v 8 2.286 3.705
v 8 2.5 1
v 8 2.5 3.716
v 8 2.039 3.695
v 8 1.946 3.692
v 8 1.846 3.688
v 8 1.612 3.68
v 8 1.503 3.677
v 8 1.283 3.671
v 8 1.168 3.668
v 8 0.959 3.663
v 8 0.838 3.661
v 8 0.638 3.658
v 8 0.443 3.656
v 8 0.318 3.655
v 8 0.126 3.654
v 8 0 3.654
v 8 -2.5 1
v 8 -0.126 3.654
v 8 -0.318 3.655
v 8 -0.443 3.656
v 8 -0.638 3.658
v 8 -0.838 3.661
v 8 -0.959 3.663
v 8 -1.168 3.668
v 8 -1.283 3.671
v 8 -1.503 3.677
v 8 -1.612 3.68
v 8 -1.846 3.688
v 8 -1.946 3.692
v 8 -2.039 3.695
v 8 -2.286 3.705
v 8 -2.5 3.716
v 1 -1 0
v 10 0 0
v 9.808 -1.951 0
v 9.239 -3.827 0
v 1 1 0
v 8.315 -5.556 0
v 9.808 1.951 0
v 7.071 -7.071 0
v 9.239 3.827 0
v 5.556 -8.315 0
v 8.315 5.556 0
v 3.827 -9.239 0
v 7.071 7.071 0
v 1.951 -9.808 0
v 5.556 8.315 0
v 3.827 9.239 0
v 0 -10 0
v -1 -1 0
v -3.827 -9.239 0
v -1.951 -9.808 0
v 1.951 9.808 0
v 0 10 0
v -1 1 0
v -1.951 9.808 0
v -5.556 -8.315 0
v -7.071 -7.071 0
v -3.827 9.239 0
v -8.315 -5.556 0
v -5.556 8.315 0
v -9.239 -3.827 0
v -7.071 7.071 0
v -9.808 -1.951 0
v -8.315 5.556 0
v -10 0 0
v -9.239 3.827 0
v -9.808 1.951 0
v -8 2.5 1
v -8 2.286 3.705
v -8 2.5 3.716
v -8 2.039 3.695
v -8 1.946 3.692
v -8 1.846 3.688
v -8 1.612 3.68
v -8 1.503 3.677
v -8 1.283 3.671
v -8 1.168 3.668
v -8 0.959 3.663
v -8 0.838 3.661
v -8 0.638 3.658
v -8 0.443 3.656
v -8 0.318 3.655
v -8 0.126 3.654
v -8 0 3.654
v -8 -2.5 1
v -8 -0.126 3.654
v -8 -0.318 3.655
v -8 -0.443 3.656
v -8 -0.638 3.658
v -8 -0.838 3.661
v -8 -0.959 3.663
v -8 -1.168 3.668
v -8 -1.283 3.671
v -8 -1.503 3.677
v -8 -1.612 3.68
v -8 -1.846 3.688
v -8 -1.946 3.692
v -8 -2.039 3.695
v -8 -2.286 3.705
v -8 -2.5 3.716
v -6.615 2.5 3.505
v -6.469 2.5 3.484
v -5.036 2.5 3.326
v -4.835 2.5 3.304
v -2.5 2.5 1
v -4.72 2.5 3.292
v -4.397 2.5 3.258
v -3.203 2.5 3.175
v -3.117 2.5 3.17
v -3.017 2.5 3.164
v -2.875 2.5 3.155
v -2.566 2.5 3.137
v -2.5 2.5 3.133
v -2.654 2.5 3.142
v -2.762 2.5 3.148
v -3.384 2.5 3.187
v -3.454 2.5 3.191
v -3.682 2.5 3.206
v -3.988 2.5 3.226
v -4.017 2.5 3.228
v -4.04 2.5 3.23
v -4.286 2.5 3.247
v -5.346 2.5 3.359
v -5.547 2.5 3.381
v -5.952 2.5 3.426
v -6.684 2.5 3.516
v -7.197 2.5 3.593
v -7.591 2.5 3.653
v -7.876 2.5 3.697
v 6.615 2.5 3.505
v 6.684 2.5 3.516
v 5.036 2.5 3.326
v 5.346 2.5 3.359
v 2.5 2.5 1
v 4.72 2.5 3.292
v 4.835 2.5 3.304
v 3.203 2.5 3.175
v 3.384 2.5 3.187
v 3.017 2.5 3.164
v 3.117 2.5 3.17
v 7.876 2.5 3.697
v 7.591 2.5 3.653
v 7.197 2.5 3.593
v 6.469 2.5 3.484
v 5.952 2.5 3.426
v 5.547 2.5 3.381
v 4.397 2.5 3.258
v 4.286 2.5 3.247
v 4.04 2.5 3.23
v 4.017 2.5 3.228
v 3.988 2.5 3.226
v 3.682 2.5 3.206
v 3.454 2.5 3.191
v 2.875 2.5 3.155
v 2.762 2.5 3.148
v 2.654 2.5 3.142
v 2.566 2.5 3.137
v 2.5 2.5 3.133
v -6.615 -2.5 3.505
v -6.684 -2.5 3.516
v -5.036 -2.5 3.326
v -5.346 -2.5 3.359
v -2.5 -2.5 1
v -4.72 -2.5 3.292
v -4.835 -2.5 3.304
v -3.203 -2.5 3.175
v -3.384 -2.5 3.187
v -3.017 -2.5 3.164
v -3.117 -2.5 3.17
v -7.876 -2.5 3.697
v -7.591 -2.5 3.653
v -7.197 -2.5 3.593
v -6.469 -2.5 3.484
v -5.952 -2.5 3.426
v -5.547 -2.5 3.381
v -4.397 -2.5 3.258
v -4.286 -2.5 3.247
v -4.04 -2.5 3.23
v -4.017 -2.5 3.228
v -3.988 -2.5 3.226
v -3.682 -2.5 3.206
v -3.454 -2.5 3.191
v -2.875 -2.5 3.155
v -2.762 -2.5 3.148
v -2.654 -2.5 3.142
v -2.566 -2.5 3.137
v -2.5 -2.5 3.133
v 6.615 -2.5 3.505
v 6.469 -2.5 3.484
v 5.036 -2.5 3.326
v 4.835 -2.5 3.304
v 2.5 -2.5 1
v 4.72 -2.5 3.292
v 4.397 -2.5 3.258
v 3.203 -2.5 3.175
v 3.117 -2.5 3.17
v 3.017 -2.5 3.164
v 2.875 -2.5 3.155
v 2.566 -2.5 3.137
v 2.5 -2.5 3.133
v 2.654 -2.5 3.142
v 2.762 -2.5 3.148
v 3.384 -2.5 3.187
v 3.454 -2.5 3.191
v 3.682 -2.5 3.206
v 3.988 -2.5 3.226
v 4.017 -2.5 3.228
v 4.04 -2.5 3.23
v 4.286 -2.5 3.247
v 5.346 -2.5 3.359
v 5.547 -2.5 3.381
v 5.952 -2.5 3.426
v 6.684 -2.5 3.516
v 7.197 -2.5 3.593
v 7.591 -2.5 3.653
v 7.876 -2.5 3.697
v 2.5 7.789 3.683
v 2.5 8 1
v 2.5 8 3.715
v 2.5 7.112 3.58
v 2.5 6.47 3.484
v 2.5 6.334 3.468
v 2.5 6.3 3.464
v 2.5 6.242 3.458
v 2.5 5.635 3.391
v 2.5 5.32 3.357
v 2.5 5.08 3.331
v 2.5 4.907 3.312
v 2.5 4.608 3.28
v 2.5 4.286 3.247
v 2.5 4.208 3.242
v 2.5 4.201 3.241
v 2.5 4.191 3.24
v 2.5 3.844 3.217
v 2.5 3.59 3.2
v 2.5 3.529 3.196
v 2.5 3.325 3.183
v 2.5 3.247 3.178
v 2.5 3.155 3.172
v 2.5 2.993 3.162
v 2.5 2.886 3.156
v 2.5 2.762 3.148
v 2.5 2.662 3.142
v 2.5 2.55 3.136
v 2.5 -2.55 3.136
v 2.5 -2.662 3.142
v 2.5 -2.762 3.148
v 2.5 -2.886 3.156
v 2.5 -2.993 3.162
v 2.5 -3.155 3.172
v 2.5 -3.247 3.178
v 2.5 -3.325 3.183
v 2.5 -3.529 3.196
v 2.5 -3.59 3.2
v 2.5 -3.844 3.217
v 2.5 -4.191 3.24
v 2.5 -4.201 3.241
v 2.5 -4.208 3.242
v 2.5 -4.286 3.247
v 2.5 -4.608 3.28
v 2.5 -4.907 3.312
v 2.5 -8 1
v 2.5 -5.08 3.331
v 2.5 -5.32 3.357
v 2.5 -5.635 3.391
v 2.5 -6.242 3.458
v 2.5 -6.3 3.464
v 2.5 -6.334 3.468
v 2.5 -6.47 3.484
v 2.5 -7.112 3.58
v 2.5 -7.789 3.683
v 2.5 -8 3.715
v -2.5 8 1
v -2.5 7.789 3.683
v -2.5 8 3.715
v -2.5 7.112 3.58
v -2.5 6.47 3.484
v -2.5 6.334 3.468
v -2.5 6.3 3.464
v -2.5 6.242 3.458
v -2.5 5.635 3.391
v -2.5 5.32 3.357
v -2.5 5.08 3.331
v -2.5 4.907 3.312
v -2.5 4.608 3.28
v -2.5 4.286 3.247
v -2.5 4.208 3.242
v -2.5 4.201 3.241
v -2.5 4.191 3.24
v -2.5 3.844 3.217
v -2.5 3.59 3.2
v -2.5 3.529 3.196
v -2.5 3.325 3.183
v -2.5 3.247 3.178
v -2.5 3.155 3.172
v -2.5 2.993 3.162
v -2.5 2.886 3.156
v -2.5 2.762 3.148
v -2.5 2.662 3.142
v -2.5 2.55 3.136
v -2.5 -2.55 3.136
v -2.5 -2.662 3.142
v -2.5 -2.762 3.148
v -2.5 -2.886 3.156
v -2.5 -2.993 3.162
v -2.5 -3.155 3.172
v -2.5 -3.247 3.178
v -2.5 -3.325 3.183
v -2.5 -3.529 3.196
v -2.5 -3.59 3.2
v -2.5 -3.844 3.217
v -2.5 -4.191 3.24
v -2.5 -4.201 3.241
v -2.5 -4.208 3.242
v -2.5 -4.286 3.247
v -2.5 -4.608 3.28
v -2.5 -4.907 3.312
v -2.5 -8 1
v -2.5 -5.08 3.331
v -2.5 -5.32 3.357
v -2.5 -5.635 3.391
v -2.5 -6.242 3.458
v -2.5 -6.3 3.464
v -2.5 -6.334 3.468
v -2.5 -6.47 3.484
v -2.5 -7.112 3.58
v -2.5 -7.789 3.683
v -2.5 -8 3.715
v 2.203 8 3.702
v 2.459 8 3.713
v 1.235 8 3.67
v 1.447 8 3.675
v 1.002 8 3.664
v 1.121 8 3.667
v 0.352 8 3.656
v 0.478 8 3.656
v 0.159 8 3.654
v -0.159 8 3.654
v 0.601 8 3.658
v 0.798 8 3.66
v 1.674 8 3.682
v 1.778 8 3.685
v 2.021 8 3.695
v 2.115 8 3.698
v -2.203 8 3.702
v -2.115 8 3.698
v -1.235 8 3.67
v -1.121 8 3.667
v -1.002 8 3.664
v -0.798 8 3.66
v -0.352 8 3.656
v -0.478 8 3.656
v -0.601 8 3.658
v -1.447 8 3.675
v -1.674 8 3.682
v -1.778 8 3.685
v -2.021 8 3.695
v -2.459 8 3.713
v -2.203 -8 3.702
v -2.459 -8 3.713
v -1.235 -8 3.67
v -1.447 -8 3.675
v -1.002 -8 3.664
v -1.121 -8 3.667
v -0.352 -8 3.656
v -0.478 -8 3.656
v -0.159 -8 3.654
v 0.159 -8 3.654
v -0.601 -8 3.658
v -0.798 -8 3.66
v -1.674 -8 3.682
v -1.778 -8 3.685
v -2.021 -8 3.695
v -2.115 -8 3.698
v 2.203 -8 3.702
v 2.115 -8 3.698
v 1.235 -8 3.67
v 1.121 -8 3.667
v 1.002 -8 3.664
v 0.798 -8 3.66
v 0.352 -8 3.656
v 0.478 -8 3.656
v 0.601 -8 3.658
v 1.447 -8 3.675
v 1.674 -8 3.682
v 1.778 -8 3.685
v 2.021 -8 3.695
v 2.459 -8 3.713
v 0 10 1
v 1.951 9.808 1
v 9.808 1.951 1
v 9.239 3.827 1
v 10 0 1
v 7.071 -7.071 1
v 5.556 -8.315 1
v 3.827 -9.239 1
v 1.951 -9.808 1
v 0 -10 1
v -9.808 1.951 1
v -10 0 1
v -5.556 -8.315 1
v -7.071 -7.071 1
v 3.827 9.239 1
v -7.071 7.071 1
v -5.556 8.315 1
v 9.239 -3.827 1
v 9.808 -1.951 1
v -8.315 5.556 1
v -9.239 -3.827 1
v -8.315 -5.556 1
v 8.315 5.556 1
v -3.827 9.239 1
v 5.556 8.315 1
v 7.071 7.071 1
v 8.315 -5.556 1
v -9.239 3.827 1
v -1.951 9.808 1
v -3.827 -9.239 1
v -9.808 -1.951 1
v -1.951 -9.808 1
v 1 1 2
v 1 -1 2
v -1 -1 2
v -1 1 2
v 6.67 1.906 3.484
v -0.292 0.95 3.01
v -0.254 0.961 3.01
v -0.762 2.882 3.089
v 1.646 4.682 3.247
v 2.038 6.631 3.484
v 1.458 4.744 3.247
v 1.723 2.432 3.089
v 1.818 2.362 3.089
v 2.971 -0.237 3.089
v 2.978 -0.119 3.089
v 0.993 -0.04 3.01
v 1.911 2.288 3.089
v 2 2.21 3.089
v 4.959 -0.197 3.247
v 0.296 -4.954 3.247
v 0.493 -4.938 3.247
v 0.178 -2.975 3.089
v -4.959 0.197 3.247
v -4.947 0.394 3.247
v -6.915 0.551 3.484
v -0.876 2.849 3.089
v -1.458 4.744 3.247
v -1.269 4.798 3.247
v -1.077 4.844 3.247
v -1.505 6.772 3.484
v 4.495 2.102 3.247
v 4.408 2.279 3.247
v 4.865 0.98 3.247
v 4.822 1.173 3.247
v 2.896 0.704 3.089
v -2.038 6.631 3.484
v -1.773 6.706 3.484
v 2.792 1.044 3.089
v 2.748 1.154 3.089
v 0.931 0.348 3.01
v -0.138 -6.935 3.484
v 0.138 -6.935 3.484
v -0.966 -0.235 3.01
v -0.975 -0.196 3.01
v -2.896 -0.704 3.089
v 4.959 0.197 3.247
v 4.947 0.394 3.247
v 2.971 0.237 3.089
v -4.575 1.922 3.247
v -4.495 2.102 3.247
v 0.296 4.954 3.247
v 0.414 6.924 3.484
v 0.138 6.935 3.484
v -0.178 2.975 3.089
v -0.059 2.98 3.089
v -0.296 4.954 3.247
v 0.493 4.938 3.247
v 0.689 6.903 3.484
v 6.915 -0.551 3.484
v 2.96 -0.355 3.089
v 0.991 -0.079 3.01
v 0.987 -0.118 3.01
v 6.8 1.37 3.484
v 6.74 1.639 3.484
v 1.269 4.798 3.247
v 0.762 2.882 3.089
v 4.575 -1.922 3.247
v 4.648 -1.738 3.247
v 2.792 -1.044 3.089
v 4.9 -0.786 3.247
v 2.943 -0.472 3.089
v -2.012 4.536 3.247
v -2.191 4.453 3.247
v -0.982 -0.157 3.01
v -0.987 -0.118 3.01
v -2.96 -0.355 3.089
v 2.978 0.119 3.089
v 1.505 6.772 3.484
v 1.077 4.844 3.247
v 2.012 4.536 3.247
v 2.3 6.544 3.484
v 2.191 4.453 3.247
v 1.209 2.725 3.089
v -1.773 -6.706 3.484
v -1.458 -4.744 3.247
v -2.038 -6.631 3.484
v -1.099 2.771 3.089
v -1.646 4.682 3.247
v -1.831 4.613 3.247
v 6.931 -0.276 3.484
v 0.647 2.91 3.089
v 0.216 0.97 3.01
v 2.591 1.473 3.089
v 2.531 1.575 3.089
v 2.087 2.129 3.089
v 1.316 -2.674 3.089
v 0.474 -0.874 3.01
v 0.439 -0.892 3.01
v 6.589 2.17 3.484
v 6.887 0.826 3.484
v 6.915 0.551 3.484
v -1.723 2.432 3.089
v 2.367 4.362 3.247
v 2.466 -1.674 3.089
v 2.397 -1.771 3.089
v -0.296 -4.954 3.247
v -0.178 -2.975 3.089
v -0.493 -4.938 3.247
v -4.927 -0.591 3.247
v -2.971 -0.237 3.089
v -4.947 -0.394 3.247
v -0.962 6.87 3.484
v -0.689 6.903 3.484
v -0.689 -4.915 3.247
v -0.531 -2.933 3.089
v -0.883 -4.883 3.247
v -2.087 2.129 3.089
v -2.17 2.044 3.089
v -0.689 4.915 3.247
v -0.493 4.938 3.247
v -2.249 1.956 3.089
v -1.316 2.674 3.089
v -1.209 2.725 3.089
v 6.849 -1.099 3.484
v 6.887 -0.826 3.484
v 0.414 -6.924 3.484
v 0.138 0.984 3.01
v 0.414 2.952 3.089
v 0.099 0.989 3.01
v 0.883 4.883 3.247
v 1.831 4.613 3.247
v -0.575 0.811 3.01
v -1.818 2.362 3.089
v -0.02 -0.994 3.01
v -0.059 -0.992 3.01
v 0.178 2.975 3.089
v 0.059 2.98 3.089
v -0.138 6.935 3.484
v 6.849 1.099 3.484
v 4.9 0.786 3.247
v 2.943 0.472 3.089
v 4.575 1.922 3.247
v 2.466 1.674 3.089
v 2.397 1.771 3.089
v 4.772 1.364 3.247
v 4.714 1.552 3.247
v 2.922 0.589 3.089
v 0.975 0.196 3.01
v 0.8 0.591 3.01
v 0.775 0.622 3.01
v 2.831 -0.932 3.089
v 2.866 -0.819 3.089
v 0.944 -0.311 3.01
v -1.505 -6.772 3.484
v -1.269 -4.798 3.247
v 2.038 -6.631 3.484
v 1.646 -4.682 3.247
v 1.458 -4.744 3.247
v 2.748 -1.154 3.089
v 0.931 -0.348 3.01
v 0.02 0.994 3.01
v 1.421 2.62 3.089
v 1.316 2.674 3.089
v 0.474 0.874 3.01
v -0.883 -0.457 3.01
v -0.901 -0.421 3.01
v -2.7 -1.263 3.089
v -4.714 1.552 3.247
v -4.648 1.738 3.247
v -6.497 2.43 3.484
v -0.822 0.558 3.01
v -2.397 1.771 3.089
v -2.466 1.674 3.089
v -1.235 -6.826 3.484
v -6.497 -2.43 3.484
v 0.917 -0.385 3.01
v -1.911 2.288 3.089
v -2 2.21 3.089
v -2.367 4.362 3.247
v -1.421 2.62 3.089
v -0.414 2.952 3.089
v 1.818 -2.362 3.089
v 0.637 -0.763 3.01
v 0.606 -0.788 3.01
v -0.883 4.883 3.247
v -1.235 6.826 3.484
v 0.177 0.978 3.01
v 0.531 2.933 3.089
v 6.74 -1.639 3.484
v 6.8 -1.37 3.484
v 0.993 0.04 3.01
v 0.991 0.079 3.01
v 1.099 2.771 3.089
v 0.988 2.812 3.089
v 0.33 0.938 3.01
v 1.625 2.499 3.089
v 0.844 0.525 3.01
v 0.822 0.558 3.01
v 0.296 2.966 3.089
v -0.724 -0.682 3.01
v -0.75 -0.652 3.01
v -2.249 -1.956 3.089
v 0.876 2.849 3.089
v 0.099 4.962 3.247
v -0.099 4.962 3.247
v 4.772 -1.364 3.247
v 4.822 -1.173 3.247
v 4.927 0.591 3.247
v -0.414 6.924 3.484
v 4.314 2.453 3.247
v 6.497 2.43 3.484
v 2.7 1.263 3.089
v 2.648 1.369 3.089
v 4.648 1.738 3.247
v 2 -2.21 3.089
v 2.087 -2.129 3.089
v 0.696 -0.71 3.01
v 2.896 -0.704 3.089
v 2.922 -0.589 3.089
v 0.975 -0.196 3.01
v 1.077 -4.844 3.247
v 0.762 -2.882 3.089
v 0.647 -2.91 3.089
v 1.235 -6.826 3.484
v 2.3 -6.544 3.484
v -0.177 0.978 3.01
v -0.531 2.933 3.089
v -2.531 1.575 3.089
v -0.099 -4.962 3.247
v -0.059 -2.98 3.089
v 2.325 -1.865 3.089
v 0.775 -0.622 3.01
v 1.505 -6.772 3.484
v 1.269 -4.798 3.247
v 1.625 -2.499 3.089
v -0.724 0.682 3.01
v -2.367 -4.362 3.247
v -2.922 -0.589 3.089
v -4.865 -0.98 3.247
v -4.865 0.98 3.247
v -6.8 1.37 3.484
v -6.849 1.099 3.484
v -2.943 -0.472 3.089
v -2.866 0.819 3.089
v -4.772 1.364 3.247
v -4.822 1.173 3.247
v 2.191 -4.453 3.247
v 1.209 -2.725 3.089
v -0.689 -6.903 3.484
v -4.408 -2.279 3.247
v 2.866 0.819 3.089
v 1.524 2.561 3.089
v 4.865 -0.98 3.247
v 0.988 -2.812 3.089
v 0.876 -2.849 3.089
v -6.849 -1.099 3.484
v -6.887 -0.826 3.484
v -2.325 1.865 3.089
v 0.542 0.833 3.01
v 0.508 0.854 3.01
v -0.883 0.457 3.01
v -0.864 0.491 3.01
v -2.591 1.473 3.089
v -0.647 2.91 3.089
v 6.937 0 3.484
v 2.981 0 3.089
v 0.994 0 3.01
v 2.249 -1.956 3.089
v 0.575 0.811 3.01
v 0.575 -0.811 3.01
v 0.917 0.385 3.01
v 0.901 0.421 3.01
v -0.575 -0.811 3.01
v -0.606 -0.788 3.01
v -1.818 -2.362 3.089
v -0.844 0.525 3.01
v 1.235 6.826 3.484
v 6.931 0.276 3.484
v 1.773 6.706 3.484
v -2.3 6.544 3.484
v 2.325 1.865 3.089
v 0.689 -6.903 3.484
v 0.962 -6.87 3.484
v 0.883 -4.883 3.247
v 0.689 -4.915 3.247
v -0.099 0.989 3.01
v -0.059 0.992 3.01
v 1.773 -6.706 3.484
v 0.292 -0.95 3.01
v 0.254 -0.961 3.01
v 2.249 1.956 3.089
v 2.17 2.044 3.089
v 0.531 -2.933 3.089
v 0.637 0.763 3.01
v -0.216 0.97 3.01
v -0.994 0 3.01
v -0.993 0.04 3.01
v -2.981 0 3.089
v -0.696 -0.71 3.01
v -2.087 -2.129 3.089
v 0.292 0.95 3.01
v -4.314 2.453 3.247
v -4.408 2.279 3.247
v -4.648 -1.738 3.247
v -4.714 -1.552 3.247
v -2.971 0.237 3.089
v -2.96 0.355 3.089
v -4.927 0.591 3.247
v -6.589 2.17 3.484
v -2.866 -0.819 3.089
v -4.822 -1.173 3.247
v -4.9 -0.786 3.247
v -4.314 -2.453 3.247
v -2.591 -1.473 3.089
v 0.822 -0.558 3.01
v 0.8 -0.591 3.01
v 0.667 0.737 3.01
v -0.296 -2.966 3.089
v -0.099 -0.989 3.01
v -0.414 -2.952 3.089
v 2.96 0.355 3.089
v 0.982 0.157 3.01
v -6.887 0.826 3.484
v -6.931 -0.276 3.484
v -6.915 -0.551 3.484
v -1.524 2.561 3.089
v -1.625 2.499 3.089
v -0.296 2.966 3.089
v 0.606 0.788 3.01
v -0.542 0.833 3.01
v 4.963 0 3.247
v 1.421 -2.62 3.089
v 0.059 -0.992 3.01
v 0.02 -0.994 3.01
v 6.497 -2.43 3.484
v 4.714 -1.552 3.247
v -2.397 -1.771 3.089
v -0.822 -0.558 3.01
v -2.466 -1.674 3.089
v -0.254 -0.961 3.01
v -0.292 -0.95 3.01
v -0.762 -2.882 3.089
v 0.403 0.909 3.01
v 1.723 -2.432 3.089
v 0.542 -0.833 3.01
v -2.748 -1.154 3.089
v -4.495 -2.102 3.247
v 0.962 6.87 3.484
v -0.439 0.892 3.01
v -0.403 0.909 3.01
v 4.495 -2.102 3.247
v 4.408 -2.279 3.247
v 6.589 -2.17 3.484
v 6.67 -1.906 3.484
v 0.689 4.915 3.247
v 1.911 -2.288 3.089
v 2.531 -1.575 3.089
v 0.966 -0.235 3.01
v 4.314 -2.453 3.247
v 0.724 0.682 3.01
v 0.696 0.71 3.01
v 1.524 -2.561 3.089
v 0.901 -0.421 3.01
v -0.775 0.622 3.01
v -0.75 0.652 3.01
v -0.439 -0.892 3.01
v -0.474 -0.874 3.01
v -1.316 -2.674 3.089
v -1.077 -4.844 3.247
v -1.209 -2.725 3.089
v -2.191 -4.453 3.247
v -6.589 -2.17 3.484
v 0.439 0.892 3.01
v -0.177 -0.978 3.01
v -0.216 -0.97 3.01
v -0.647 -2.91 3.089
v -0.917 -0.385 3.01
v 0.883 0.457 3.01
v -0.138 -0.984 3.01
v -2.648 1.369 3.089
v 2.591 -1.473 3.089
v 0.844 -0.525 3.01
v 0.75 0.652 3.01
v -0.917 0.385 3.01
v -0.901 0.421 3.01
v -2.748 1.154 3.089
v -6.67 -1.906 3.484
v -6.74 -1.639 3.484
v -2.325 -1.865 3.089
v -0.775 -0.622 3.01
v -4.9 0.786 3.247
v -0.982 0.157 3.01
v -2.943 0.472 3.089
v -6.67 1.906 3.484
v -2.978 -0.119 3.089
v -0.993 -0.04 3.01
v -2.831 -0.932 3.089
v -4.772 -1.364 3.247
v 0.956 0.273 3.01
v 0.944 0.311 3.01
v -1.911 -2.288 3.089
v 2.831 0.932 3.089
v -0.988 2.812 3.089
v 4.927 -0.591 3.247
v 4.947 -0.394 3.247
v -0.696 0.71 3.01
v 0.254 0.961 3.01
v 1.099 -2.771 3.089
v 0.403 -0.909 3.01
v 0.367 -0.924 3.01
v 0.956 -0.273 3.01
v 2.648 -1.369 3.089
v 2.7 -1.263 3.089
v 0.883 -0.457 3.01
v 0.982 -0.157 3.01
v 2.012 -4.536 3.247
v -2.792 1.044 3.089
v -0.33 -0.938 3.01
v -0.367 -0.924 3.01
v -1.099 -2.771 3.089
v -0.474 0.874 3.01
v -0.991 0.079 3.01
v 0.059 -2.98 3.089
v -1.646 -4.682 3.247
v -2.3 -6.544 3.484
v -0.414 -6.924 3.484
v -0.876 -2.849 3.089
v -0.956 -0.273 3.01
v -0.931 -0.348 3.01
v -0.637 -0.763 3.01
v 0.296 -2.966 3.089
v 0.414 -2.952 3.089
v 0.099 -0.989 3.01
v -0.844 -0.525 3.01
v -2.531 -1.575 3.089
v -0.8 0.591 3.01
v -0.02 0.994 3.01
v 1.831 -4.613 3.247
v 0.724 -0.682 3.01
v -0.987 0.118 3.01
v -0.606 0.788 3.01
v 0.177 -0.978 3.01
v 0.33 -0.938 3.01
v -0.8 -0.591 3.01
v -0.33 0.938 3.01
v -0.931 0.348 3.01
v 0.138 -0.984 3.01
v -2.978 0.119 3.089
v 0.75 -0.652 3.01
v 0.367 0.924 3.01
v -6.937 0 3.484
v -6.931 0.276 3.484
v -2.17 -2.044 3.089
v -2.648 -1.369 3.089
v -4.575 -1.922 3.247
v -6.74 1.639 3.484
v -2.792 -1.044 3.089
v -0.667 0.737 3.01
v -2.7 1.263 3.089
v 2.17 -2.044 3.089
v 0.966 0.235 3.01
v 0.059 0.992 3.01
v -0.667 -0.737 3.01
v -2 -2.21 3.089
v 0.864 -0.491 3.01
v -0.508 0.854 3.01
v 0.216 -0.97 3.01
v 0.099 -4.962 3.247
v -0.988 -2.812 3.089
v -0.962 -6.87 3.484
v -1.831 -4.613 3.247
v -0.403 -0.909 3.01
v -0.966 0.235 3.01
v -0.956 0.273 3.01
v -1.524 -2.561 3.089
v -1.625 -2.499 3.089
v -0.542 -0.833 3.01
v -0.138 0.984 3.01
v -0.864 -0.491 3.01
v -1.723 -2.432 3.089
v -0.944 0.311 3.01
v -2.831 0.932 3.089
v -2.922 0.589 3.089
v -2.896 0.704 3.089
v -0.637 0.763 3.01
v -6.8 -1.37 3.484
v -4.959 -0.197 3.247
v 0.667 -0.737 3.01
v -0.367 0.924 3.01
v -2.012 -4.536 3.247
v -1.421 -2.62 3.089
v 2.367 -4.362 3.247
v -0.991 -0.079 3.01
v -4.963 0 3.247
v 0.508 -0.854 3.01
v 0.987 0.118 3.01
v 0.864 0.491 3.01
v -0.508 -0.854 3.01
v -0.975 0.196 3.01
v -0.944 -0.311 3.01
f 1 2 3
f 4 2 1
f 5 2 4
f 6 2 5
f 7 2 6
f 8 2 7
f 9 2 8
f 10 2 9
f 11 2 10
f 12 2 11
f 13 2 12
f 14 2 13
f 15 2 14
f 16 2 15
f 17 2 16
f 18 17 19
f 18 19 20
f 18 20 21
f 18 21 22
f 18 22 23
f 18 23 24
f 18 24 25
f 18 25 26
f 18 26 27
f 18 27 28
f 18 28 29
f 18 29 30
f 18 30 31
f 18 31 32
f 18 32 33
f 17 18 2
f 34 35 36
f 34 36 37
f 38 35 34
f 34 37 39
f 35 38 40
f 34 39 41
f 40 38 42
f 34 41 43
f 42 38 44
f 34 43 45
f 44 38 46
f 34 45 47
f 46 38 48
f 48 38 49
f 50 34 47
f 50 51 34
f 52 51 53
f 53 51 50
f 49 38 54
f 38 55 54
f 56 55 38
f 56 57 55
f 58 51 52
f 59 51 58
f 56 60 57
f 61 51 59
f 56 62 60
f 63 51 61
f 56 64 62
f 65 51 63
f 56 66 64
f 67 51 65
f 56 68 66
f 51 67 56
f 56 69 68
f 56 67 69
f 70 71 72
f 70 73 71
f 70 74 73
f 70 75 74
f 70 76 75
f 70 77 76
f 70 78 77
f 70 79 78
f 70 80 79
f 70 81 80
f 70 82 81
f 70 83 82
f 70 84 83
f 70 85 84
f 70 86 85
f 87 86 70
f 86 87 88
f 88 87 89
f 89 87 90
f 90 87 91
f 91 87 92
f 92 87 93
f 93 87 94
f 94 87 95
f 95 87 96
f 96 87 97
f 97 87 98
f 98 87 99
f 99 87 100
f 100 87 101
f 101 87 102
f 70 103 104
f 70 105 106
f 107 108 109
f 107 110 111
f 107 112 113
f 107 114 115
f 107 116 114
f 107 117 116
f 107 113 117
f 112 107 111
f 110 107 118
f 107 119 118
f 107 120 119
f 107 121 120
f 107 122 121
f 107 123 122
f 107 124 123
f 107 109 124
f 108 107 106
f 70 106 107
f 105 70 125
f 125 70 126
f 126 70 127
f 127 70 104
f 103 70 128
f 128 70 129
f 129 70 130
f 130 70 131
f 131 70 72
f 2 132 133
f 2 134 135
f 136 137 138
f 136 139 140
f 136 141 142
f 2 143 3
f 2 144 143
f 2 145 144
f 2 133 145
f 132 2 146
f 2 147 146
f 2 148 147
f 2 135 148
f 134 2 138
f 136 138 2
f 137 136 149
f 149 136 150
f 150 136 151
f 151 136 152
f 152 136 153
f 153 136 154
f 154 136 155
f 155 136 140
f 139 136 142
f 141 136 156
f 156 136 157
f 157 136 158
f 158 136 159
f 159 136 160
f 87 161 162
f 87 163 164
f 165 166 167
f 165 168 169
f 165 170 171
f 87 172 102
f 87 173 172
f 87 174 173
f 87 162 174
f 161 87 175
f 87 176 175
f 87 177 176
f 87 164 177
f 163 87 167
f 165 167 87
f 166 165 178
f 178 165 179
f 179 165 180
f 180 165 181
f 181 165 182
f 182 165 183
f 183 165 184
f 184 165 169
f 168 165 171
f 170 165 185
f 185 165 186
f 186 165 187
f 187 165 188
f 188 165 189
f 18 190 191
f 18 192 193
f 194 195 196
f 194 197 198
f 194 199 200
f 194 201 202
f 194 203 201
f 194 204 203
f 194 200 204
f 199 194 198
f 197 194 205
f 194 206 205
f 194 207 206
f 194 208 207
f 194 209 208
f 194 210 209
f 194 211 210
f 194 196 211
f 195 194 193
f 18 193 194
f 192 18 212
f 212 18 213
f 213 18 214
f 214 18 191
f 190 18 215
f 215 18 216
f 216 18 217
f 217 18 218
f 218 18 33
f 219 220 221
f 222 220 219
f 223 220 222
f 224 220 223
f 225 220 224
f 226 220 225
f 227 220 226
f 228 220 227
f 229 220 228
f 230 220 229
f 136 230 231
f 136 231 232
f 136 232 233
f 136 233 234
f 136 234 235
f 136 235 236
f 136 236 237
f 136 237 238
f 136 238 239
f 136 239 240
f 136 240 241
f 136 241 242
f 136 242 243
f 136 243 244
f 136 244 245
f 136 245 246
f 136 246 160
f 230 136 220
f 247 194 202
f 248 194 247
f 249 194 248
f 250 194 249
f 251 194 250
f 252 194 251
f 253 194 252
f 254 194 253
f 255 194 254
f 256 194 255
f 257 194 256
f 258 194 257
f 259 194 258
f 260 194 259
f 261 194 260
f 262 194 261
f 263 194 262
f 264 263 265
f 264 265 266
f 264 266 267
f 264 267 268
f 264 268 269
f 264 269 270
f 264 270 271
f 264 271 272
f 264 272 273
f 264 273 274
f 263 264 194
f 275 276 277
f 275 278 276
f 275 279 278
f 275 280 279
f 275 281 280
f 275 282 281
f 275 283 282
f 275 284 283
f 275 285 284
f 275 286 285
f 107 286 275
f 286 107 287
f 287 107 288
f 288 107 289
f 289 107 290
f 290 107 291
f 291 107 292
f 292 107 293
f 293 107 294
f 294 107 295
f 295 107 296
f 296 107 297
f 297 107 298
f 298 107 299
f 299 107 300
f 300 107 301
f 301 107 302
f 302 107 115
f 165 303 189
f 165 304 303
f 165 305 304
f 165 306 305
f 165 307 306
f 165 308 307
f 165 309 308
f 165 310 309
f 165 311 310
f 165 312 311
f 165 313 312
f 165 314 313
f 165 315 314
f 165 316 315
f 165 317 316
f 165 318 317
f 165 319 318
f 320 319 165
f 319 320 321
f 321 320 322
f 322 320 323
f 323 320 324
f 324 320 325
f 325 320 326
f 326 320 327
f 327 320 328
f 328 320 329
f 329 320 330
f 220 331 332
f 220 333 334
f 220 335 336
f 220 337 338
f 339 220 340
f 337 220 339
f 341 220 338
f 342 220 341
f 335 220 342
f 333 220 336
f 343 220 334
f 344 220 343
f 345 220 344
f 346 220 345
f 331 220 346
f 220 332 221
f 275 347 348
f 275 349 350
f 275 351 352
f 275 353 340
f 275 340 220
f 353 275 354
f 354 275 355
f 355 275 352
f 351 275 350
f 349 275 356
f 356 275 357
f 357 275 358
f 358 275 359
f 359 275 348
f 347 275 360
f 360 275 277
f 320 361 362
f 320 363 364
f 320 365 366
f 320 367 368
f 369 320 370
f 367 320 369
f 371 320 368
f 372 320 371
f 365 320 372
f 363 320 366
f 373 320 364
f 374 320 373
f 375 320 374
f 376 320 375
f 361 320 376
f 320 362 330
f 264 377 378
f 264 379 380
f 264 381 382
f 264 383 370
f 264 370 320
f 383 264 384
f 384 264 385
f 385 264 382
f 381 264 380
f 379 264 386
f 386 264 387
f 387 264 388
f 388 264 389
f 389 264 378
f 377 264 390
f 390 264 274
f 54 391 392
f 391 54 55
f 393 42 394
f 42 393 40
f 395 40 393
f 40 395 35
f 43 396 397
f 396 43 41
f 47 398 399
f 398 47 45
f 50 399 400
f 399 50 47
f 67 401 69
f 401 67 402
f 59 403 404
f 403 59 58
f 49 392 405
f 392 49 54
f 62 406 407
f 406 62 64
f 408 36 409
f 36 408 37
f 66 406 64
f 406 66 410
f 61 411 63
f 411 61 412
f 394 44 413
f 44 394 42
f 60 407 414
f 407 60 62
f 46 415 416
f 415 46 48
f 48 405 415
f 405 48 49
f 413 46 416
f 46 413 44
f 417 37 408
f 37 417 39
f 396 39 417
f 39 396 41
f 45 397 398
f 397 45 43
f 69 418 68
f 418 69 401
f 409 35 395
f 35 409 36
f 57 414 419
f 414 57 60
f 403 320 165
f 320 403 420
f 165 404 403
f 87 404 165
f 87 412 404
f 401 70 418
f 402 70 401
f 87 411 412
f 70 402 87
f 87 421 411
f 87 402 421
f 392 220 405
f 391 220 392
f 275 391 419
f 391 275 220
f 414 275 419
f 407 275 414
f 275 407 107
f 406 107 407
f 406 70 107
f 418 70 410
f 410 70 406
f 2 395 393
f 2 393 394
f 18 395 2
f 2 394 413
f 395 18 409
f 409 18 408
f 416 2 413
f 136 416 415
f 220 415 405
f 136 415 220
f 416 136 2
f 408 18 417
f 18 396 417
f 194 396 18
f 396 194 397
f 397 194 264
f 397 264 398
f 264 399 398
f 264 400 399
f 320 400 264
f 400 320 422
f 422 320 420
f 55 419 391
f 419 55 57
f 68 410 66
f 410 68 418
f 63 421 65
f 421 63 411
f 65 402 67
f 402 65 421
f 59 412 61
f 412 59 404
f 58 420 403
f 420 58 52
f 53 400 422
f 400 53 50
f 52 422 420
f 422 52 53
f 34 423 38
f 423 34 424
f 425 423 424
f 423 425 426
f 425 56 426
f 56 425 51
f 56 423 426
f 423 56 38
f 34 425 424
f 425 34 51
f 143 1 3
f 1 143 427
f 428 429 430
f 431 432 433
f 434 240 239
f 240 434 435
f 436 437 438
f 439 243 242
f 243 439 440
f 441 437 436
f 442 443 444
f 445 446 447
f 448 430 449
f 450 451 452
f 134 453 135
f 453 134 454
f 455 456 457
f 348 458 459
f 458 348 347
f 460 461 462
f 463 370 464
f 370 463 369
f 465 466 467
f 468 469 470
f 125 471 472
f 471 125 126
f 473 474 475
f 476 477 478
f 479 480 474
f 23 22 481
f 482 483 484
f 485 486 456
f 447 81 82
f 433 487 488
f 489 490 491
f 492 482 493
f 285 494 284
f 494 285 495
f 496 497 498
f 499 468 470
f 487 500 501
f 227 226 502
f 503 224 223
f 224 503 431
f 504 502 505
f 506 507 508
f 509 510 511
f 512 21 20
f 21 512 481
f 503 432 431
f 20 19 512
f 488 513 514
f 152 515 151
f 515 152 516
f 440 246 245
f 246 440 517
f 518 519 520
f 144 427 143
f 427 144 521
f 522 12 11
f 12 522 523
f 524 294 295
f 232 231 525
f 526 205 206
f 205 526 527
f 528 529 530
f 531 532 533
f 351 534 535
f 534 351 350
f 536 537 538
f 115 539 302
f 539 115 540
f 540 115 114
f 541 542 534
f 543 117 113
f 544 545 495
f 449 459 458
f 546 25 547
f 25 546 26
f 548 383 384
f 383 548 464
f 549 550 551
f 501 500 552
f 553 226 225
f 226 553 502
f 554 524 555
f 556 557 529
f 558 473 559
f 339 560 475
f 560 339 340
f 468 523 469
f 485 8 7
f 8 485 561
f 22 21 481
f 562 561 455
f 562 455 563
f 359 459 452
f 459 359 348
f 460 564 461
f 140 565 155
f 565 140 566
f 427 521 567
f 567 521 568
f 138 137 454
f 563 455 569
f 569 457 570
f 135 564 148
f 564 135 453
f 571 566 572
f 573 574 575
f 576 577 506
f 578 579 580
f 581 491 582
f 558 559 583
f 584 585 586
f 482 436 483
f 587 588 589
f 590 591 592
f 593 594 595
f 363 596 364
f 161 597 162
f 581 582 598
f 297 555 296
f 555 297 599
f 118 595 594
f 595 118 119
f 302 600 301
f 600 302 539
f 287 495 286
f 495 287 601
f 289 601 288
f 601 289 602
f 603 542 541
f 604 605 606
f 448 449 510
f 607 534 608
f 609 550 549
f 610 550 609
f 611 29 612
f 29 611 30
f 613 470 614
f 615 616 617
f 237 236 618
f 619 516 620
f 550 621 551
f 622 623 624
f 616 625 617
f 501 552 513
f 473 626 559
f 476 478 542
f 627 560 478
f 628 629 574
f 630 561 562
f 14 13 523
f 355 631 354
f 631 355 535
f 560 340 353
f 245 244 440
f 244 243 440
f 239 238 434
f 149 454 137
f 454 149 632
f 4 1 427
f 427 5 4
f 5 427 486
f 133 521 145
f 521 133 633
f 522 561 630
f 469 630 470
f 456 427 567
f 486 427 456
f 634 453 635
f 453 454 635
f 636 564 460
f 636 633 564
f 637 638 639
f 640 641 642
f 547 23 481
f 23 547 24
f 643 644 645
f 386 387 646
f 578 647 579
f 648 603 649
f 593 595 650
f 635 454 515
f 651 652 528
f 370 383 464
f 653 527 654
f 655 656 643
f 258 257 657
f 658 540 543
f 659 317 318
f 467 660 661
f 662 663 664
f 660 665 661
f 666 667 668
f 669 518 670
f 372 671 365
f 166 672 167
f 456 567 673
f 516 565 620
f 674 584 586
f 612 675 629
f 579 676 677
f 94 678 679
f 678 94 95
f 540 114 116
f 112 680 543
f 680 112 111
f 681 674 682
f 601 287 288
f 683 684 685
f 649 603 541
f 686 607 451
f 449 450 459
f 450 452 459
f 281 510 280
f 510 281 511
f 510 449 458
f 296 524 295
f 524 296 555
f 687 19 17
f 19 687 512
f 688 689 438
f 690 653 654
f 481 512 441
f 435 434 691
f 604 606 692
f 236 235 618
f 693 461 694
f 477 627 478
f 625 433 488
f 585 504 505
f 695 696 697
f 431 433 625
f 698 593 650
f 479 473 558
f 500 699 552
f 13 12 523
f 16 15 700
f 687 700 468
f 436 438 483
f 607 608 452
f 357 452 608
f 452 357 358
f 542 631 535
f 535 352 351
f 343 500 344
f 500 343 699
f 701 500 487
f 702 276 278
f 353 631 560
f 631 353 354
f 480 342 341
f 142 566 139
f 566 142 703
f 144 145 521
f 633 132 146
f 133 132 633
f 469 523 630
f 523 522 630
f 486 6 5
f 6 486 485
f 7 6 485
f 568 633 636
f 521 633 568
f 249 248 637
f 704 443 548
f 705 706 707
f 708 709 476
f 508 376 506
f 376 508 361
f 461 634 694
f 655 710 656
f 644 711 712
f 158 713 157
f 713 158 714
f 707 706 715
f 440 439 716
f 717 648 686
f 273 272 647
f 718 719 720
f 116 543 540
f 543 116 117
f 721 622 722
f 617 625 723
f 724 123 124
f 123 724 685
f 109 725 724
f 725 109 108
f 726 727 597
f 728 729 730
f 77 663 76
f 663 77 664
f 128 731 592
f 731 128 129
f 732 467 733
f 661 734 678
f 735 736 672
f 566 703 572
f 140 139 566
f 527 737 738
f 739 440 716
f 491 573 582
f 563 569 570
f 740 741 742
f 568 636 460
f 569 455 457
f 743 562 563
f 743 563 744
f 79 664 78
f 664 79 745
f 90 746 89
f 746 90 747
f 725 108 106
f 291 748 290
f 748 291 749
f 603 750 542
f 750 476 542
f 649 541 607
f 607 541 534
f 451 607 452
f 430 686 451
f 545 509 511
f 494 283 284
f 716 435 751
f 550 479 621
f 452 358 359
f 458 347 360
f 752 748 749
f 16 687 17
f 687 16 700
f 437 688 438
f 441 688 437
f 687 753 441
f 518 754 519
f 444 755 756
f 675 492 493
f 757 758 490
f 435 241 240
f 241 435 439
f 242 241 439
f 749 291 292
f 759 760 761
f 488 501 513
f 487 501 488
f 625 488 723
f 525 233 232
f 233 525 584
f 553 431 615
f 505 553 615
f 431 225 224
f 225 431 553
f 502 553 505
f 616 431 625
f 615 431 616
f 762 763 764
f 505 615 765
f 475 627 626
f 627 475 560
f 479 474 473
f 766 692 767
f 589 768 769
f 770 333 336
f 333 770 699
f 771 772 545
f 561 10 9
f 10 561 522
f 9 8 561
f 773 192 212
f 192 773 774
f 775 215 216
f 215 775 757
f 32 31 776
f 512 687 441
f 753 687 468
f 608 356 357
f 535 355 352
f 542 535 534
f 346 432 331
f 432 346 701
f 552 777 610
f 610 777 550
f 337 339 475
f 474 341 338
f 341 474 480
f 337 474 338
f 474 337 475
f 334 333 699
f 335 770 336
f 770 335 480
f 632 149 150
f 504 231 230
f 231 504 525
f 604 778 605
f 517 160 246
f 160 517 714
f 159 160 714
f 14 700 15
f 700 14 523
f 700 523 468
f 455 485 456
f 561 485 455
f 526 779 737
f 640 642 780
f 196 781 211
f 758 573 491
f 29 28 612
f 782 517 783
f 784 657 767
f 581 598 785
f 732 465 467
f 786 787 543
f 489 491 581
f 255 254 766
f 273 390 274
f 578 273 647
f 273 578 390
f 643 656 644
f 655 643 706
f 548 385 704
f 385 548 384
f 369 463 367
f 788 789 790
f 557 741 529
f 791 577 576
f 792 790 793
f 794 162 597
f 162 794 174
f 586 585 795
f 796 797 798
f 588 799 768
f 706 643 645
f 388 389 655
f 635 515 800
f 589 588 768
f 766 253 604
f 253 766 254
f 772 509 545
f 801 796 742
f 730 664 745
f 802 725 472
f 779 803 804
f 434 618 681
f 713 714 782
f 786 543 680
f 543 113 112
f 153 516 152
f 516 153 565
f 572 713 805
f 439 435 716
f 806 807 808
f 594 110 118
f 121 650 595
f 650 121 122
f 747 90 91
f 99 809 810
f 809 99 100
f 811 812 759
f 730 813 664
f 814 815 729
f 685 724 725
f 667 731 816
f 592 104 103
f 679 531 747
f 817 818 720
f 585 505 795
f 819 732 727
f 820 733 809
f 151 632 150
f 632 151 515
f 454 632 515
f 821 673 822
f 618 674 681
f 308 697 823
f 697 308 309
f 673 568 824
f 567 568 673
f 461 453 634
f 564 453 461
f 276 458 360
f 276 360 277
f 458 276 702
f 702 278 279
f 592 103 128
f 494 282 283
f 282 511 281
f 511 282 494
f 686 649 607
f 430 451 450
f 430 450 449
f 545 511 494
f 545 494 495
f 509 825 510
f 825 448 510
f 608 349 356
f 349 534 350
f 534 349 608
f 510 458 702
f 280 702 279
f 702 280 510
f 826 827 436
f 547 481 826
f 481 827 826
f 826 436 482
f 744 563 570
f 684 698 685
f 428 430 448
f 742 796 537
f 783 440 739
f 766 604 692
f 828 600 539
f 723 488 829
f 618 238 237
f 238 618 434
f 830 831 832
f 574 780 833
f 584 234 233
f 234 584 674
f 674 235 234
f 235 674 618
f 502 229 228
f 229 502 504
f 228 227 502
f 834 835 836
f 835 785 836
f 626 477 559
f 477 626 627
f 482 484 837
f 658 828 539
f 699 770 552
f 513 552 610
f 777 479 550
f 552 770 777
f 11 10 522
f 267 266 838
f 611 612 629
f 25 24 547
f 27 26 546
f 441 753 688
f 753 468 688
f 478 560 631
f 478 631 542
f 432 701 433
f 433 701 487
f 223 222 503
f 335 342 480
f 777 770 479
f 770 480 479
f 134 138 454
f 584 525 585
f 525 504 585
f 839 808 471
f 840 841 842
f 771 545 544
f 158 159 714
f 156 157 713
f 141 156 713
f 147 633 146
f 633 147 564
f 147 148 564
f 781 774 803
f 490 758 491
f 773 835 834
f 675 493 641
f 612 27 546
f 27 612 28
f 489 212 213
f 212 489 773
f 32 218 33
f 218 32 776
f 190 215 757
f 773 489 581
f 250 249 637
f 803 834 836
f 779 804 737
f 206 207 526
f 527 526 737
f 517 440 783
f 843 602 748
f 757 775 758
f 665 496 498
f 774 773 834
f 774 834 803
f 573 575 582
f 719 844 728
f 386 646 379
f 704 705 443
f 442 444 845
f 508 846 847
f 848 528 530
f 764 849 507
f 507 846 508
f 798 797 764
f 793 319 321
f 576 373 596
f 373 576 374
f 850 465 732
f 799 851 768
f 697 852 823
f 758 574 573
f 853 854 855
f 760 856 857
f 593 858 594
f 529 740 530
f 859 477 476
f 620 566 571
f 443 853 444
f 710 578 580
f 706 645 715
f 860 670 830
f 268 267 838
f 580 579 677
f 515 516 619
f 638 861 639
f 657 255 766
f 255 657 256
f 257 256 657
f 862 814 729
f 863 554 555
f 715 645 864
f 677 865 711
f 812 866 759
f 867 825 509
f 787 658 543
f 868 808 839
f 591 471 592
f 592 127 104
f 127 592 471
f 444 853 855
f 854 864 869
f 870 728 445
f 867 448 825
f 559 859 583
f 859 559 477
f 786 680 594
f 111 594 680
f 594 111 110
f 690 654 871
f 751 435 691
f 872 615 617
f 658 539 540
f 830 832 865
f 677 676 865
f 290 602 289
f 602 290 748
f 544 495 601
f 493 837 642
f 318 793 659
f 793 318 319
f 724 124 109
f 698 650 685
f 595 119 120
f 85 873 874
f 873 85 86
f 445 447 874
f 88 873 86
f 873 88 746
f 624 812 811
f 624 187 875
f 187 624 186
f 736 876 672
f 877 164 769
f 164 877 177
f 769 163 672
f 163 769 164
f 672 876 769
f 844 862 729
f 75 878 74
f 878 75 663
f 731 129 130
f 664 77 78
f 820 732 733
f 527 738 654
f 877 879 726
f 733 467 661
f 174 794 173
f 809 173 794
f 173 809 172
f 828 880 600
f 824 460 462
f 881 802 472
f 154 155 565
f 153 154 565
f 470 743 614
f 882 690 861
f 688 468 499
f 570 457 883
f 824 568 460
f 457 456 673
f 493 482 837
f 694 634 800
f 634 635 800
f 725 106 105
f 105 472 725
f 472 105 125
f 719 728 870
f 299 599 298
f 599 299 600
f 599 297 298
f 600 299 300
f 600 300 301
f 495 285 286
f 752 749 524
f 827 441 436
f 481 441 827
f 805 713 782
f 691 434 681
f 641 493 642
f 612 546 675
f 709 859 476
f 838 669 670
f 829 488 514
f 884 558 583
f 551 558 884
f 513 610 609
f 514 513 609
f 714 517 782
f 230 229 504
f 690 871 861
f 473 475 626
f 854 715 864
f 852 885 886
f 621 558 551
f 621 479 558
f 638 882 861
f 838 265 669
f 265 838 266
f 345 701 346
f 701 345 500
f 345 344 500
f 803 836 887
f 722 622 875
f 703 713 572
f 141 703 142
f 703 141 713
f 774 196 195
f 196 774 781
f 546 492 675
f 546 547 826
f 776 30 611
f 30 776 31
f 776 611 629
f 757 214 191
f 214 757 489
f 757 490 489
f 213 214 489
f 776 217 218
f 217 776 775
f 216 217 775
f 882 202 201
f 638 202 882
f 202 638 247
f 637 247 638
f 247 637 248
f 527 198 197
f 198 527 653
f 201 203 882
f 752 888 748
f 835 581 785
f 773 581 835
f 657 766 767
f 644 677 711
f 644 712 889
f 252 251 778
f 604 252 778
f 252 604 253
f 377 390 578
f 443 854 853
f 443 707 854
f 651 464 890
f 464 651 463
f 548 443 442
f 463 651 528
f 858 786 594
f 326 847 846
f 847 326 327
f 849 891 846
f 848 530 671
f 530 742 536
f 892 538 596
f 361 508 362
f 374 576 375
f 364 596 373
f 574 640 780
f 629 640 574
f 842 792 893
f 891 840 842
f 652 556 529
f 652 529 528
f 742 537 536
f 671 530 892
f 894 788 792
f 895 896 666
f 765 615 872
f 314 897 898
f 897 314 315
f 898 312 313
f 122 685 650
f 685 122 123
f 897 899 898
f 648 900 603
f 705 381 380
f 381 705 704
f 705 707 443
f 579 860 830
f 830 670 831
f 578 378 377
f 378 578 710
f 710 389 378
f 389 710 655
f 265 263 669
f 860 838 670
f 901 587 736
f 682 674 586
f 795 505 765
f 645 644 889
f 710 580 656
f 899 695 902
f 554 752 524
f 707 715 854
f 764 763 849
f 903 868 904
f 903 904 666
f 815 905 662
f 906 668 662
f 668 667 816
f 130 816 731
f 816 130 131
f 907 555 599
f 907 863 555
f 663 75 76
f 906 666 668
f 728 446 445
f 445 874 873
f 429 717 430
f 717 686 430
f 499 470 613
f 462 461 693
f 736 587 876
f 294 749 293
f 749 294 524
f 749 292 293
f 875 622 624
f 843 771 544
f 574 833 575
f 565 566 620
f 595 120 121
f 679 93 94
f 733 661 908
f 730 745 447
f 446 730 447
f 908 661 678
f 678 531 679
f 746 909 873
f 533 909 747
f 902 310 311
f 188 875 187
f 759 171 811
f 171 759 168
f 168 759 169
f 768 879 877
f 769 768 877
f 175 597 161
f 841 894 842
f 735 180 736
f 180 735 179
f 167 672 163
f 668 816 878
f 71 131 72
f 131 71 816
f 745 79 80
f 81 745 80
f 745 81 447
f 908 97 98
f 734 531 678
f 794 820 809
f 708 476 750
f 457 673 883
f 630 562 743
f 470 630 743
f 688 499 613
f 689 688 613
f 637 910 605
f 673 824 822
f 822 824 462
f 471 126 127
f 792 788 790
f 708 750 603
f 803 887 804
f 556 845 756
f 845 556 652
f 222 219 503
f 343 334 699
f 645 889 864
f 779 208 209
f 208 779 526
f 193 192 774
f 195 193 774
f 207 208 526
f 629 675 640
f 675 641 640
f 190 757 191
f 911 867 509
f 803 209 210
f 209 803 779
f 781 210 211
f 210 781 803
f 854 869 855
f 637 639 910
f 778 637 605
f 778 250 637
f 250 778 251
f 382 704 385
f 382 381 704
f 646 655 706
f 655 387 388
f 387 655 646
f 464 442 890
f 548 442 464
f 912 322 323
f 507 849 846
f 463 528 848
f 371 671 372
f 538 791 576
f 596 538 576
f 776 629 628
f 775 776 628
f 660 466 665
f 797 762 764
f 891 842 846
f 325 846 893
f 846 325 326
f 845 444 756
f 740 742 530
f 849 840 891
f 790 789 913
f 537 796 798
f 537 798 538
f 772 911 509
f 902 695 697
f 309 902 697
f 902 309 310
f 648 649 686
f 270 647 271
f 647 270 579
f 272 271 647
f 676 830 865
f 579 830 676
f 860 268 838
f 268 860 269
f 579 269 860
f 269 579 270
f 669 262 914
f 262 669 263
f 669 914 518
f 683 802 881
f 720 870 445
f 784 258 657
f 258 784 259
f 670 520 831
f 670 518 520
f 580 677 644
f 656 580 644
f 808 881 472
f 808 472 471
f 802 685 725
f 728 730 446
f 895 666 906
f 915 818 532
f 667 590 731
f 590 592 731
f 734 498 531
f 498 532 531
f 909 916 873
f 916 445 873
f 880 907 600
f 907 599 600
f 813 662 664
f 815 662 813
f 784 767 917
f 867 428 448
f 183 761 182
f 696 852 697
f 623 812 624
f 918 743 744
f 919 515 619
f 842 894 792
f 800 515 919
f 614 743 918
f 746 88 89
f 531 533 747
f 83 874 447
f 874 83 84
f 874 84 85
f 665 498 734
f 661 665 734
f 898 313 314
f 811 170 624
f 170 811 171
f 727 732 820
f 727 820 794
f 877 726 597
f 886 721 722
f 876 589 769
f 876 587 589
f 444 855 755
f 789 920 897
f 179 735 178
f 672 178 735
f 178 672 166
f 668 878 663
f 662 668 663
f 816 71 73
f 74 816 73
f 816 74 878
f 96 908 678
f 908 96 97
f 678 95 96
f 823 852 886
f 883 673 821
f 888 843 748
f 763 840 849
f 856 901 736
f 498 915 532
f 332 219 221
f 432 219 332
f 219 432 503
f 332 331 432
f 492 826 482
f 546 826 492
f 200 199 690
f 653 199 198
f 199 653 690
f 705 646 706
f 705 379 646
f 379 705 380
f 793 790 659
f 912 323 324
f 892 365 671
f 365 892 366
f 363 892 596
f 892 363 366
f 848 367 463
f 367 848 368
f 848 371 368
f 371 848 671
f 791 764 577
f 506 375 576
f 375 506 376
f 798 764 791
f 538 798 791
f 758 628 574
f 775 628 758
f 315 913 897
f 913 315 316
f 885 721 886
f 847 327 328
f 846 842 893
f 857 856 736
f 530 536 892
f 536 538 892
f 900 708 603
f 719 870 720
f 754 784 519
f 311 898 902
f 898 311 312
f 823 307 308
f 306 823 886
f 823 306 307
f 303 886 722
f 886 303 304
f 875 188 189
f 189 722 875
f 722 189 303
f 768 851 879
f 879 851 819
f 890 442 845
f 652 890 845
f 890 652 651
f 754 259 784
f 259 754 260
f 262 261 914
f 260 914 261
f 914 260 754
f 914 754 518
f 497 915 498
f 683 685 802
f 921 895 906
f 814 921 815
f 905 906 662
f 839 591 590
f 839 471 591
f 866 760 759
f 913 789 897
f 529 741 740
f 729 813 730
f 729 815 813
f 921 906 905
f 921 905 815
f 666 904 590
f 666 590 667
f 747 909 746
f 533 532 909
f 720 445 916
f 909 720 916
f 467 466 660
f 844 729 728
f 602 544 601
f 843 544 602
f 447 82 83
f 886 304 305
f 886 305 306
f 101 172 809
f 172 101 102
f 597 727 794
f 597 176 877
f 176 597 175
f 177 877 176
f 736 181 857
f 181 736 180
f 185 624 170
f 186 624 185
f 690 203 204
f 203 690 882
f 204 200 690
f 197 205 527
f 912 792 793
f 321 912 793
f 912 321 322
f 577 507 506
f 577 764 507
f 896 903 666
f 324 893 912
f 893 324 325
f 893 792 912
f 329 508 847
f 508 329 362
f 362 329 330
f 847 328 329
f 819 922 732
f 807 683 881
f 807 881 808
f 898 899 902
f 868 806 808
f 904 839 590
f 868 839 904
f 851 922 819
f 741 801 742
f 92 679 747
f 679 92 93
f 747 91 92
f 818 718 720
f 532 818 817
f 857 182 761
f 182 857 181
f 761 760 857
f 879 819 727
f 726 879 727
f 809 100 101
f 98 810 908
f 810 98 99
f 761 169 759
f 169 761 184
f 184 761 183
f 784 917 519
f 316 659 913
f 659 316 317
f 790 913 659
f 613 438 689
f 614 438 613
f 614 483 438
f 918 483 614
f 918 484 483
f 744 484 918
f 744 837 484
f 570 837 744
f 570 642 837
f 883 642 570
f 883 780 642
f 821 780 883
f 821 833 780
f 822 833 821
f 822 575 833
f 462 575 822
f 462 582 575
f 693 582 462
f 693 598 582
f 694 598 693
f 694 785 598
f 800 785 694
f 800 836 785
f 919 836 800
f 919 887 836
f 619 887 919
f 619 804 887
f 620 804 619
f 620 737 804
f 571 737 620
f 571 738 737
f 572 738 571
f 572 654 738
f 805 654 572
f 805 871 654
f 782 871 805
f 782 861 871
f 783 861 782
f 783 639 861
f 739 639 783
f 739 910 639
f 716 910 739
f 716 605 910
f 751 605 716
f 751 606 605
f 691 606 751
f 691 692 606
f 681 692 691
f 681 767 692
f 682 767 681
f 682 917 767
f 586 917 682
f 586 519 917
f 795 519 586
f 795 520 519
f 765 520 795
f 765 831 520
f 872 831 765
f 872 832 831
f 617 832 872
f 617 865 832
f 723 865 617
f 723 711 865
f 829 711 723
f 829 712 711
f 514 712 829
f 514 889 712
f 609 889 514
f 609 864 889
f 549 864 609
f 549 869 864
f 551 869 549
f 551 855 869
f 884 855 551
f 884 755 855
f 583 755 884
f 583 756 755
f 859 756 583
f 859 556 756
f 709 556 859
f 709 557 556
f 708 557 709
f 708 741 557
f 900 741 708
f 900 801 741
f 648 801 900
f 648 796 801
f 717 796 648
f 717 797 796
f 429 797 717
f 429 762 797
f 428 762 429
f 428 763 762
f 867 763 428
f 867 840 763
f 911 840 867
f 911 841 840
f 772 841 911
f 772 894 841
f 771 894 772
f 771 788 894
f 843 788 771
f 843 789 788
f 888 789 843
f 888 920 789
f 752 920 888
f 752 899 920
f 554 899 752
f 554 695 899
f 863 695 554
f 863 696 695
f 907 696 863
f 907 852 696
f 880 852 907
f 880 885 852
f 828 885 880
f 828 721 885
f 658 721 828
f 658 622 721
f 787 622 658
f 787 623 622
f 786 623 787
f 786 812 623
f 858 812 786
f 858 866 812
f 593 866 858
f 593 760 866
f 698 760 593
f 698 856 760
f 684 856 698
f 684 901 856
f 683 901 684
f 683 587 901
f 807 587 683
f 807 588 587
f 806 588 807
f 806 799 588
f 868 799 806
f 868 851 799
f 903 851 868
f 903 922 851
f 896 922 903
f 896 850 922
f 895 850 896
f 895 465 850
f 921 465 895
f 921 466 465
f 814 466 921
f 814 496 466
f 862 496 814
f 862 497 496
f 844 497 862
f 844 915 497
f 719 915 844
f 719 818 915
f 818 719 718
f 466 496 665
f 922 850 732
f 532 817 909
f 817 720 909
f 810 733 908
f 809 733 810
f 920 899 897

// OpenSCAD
$fa=2;

difference(){
union(){
	translate([0,0,2])union(){
		cube([16,5,4],center=true);
		cube([5,16,4],center=true);
	}
	cylinder(d=20);
}
translate([0,0,1])cube([2,2,2],center=true);
translate([0,0,53])sphere(r=50);
}
